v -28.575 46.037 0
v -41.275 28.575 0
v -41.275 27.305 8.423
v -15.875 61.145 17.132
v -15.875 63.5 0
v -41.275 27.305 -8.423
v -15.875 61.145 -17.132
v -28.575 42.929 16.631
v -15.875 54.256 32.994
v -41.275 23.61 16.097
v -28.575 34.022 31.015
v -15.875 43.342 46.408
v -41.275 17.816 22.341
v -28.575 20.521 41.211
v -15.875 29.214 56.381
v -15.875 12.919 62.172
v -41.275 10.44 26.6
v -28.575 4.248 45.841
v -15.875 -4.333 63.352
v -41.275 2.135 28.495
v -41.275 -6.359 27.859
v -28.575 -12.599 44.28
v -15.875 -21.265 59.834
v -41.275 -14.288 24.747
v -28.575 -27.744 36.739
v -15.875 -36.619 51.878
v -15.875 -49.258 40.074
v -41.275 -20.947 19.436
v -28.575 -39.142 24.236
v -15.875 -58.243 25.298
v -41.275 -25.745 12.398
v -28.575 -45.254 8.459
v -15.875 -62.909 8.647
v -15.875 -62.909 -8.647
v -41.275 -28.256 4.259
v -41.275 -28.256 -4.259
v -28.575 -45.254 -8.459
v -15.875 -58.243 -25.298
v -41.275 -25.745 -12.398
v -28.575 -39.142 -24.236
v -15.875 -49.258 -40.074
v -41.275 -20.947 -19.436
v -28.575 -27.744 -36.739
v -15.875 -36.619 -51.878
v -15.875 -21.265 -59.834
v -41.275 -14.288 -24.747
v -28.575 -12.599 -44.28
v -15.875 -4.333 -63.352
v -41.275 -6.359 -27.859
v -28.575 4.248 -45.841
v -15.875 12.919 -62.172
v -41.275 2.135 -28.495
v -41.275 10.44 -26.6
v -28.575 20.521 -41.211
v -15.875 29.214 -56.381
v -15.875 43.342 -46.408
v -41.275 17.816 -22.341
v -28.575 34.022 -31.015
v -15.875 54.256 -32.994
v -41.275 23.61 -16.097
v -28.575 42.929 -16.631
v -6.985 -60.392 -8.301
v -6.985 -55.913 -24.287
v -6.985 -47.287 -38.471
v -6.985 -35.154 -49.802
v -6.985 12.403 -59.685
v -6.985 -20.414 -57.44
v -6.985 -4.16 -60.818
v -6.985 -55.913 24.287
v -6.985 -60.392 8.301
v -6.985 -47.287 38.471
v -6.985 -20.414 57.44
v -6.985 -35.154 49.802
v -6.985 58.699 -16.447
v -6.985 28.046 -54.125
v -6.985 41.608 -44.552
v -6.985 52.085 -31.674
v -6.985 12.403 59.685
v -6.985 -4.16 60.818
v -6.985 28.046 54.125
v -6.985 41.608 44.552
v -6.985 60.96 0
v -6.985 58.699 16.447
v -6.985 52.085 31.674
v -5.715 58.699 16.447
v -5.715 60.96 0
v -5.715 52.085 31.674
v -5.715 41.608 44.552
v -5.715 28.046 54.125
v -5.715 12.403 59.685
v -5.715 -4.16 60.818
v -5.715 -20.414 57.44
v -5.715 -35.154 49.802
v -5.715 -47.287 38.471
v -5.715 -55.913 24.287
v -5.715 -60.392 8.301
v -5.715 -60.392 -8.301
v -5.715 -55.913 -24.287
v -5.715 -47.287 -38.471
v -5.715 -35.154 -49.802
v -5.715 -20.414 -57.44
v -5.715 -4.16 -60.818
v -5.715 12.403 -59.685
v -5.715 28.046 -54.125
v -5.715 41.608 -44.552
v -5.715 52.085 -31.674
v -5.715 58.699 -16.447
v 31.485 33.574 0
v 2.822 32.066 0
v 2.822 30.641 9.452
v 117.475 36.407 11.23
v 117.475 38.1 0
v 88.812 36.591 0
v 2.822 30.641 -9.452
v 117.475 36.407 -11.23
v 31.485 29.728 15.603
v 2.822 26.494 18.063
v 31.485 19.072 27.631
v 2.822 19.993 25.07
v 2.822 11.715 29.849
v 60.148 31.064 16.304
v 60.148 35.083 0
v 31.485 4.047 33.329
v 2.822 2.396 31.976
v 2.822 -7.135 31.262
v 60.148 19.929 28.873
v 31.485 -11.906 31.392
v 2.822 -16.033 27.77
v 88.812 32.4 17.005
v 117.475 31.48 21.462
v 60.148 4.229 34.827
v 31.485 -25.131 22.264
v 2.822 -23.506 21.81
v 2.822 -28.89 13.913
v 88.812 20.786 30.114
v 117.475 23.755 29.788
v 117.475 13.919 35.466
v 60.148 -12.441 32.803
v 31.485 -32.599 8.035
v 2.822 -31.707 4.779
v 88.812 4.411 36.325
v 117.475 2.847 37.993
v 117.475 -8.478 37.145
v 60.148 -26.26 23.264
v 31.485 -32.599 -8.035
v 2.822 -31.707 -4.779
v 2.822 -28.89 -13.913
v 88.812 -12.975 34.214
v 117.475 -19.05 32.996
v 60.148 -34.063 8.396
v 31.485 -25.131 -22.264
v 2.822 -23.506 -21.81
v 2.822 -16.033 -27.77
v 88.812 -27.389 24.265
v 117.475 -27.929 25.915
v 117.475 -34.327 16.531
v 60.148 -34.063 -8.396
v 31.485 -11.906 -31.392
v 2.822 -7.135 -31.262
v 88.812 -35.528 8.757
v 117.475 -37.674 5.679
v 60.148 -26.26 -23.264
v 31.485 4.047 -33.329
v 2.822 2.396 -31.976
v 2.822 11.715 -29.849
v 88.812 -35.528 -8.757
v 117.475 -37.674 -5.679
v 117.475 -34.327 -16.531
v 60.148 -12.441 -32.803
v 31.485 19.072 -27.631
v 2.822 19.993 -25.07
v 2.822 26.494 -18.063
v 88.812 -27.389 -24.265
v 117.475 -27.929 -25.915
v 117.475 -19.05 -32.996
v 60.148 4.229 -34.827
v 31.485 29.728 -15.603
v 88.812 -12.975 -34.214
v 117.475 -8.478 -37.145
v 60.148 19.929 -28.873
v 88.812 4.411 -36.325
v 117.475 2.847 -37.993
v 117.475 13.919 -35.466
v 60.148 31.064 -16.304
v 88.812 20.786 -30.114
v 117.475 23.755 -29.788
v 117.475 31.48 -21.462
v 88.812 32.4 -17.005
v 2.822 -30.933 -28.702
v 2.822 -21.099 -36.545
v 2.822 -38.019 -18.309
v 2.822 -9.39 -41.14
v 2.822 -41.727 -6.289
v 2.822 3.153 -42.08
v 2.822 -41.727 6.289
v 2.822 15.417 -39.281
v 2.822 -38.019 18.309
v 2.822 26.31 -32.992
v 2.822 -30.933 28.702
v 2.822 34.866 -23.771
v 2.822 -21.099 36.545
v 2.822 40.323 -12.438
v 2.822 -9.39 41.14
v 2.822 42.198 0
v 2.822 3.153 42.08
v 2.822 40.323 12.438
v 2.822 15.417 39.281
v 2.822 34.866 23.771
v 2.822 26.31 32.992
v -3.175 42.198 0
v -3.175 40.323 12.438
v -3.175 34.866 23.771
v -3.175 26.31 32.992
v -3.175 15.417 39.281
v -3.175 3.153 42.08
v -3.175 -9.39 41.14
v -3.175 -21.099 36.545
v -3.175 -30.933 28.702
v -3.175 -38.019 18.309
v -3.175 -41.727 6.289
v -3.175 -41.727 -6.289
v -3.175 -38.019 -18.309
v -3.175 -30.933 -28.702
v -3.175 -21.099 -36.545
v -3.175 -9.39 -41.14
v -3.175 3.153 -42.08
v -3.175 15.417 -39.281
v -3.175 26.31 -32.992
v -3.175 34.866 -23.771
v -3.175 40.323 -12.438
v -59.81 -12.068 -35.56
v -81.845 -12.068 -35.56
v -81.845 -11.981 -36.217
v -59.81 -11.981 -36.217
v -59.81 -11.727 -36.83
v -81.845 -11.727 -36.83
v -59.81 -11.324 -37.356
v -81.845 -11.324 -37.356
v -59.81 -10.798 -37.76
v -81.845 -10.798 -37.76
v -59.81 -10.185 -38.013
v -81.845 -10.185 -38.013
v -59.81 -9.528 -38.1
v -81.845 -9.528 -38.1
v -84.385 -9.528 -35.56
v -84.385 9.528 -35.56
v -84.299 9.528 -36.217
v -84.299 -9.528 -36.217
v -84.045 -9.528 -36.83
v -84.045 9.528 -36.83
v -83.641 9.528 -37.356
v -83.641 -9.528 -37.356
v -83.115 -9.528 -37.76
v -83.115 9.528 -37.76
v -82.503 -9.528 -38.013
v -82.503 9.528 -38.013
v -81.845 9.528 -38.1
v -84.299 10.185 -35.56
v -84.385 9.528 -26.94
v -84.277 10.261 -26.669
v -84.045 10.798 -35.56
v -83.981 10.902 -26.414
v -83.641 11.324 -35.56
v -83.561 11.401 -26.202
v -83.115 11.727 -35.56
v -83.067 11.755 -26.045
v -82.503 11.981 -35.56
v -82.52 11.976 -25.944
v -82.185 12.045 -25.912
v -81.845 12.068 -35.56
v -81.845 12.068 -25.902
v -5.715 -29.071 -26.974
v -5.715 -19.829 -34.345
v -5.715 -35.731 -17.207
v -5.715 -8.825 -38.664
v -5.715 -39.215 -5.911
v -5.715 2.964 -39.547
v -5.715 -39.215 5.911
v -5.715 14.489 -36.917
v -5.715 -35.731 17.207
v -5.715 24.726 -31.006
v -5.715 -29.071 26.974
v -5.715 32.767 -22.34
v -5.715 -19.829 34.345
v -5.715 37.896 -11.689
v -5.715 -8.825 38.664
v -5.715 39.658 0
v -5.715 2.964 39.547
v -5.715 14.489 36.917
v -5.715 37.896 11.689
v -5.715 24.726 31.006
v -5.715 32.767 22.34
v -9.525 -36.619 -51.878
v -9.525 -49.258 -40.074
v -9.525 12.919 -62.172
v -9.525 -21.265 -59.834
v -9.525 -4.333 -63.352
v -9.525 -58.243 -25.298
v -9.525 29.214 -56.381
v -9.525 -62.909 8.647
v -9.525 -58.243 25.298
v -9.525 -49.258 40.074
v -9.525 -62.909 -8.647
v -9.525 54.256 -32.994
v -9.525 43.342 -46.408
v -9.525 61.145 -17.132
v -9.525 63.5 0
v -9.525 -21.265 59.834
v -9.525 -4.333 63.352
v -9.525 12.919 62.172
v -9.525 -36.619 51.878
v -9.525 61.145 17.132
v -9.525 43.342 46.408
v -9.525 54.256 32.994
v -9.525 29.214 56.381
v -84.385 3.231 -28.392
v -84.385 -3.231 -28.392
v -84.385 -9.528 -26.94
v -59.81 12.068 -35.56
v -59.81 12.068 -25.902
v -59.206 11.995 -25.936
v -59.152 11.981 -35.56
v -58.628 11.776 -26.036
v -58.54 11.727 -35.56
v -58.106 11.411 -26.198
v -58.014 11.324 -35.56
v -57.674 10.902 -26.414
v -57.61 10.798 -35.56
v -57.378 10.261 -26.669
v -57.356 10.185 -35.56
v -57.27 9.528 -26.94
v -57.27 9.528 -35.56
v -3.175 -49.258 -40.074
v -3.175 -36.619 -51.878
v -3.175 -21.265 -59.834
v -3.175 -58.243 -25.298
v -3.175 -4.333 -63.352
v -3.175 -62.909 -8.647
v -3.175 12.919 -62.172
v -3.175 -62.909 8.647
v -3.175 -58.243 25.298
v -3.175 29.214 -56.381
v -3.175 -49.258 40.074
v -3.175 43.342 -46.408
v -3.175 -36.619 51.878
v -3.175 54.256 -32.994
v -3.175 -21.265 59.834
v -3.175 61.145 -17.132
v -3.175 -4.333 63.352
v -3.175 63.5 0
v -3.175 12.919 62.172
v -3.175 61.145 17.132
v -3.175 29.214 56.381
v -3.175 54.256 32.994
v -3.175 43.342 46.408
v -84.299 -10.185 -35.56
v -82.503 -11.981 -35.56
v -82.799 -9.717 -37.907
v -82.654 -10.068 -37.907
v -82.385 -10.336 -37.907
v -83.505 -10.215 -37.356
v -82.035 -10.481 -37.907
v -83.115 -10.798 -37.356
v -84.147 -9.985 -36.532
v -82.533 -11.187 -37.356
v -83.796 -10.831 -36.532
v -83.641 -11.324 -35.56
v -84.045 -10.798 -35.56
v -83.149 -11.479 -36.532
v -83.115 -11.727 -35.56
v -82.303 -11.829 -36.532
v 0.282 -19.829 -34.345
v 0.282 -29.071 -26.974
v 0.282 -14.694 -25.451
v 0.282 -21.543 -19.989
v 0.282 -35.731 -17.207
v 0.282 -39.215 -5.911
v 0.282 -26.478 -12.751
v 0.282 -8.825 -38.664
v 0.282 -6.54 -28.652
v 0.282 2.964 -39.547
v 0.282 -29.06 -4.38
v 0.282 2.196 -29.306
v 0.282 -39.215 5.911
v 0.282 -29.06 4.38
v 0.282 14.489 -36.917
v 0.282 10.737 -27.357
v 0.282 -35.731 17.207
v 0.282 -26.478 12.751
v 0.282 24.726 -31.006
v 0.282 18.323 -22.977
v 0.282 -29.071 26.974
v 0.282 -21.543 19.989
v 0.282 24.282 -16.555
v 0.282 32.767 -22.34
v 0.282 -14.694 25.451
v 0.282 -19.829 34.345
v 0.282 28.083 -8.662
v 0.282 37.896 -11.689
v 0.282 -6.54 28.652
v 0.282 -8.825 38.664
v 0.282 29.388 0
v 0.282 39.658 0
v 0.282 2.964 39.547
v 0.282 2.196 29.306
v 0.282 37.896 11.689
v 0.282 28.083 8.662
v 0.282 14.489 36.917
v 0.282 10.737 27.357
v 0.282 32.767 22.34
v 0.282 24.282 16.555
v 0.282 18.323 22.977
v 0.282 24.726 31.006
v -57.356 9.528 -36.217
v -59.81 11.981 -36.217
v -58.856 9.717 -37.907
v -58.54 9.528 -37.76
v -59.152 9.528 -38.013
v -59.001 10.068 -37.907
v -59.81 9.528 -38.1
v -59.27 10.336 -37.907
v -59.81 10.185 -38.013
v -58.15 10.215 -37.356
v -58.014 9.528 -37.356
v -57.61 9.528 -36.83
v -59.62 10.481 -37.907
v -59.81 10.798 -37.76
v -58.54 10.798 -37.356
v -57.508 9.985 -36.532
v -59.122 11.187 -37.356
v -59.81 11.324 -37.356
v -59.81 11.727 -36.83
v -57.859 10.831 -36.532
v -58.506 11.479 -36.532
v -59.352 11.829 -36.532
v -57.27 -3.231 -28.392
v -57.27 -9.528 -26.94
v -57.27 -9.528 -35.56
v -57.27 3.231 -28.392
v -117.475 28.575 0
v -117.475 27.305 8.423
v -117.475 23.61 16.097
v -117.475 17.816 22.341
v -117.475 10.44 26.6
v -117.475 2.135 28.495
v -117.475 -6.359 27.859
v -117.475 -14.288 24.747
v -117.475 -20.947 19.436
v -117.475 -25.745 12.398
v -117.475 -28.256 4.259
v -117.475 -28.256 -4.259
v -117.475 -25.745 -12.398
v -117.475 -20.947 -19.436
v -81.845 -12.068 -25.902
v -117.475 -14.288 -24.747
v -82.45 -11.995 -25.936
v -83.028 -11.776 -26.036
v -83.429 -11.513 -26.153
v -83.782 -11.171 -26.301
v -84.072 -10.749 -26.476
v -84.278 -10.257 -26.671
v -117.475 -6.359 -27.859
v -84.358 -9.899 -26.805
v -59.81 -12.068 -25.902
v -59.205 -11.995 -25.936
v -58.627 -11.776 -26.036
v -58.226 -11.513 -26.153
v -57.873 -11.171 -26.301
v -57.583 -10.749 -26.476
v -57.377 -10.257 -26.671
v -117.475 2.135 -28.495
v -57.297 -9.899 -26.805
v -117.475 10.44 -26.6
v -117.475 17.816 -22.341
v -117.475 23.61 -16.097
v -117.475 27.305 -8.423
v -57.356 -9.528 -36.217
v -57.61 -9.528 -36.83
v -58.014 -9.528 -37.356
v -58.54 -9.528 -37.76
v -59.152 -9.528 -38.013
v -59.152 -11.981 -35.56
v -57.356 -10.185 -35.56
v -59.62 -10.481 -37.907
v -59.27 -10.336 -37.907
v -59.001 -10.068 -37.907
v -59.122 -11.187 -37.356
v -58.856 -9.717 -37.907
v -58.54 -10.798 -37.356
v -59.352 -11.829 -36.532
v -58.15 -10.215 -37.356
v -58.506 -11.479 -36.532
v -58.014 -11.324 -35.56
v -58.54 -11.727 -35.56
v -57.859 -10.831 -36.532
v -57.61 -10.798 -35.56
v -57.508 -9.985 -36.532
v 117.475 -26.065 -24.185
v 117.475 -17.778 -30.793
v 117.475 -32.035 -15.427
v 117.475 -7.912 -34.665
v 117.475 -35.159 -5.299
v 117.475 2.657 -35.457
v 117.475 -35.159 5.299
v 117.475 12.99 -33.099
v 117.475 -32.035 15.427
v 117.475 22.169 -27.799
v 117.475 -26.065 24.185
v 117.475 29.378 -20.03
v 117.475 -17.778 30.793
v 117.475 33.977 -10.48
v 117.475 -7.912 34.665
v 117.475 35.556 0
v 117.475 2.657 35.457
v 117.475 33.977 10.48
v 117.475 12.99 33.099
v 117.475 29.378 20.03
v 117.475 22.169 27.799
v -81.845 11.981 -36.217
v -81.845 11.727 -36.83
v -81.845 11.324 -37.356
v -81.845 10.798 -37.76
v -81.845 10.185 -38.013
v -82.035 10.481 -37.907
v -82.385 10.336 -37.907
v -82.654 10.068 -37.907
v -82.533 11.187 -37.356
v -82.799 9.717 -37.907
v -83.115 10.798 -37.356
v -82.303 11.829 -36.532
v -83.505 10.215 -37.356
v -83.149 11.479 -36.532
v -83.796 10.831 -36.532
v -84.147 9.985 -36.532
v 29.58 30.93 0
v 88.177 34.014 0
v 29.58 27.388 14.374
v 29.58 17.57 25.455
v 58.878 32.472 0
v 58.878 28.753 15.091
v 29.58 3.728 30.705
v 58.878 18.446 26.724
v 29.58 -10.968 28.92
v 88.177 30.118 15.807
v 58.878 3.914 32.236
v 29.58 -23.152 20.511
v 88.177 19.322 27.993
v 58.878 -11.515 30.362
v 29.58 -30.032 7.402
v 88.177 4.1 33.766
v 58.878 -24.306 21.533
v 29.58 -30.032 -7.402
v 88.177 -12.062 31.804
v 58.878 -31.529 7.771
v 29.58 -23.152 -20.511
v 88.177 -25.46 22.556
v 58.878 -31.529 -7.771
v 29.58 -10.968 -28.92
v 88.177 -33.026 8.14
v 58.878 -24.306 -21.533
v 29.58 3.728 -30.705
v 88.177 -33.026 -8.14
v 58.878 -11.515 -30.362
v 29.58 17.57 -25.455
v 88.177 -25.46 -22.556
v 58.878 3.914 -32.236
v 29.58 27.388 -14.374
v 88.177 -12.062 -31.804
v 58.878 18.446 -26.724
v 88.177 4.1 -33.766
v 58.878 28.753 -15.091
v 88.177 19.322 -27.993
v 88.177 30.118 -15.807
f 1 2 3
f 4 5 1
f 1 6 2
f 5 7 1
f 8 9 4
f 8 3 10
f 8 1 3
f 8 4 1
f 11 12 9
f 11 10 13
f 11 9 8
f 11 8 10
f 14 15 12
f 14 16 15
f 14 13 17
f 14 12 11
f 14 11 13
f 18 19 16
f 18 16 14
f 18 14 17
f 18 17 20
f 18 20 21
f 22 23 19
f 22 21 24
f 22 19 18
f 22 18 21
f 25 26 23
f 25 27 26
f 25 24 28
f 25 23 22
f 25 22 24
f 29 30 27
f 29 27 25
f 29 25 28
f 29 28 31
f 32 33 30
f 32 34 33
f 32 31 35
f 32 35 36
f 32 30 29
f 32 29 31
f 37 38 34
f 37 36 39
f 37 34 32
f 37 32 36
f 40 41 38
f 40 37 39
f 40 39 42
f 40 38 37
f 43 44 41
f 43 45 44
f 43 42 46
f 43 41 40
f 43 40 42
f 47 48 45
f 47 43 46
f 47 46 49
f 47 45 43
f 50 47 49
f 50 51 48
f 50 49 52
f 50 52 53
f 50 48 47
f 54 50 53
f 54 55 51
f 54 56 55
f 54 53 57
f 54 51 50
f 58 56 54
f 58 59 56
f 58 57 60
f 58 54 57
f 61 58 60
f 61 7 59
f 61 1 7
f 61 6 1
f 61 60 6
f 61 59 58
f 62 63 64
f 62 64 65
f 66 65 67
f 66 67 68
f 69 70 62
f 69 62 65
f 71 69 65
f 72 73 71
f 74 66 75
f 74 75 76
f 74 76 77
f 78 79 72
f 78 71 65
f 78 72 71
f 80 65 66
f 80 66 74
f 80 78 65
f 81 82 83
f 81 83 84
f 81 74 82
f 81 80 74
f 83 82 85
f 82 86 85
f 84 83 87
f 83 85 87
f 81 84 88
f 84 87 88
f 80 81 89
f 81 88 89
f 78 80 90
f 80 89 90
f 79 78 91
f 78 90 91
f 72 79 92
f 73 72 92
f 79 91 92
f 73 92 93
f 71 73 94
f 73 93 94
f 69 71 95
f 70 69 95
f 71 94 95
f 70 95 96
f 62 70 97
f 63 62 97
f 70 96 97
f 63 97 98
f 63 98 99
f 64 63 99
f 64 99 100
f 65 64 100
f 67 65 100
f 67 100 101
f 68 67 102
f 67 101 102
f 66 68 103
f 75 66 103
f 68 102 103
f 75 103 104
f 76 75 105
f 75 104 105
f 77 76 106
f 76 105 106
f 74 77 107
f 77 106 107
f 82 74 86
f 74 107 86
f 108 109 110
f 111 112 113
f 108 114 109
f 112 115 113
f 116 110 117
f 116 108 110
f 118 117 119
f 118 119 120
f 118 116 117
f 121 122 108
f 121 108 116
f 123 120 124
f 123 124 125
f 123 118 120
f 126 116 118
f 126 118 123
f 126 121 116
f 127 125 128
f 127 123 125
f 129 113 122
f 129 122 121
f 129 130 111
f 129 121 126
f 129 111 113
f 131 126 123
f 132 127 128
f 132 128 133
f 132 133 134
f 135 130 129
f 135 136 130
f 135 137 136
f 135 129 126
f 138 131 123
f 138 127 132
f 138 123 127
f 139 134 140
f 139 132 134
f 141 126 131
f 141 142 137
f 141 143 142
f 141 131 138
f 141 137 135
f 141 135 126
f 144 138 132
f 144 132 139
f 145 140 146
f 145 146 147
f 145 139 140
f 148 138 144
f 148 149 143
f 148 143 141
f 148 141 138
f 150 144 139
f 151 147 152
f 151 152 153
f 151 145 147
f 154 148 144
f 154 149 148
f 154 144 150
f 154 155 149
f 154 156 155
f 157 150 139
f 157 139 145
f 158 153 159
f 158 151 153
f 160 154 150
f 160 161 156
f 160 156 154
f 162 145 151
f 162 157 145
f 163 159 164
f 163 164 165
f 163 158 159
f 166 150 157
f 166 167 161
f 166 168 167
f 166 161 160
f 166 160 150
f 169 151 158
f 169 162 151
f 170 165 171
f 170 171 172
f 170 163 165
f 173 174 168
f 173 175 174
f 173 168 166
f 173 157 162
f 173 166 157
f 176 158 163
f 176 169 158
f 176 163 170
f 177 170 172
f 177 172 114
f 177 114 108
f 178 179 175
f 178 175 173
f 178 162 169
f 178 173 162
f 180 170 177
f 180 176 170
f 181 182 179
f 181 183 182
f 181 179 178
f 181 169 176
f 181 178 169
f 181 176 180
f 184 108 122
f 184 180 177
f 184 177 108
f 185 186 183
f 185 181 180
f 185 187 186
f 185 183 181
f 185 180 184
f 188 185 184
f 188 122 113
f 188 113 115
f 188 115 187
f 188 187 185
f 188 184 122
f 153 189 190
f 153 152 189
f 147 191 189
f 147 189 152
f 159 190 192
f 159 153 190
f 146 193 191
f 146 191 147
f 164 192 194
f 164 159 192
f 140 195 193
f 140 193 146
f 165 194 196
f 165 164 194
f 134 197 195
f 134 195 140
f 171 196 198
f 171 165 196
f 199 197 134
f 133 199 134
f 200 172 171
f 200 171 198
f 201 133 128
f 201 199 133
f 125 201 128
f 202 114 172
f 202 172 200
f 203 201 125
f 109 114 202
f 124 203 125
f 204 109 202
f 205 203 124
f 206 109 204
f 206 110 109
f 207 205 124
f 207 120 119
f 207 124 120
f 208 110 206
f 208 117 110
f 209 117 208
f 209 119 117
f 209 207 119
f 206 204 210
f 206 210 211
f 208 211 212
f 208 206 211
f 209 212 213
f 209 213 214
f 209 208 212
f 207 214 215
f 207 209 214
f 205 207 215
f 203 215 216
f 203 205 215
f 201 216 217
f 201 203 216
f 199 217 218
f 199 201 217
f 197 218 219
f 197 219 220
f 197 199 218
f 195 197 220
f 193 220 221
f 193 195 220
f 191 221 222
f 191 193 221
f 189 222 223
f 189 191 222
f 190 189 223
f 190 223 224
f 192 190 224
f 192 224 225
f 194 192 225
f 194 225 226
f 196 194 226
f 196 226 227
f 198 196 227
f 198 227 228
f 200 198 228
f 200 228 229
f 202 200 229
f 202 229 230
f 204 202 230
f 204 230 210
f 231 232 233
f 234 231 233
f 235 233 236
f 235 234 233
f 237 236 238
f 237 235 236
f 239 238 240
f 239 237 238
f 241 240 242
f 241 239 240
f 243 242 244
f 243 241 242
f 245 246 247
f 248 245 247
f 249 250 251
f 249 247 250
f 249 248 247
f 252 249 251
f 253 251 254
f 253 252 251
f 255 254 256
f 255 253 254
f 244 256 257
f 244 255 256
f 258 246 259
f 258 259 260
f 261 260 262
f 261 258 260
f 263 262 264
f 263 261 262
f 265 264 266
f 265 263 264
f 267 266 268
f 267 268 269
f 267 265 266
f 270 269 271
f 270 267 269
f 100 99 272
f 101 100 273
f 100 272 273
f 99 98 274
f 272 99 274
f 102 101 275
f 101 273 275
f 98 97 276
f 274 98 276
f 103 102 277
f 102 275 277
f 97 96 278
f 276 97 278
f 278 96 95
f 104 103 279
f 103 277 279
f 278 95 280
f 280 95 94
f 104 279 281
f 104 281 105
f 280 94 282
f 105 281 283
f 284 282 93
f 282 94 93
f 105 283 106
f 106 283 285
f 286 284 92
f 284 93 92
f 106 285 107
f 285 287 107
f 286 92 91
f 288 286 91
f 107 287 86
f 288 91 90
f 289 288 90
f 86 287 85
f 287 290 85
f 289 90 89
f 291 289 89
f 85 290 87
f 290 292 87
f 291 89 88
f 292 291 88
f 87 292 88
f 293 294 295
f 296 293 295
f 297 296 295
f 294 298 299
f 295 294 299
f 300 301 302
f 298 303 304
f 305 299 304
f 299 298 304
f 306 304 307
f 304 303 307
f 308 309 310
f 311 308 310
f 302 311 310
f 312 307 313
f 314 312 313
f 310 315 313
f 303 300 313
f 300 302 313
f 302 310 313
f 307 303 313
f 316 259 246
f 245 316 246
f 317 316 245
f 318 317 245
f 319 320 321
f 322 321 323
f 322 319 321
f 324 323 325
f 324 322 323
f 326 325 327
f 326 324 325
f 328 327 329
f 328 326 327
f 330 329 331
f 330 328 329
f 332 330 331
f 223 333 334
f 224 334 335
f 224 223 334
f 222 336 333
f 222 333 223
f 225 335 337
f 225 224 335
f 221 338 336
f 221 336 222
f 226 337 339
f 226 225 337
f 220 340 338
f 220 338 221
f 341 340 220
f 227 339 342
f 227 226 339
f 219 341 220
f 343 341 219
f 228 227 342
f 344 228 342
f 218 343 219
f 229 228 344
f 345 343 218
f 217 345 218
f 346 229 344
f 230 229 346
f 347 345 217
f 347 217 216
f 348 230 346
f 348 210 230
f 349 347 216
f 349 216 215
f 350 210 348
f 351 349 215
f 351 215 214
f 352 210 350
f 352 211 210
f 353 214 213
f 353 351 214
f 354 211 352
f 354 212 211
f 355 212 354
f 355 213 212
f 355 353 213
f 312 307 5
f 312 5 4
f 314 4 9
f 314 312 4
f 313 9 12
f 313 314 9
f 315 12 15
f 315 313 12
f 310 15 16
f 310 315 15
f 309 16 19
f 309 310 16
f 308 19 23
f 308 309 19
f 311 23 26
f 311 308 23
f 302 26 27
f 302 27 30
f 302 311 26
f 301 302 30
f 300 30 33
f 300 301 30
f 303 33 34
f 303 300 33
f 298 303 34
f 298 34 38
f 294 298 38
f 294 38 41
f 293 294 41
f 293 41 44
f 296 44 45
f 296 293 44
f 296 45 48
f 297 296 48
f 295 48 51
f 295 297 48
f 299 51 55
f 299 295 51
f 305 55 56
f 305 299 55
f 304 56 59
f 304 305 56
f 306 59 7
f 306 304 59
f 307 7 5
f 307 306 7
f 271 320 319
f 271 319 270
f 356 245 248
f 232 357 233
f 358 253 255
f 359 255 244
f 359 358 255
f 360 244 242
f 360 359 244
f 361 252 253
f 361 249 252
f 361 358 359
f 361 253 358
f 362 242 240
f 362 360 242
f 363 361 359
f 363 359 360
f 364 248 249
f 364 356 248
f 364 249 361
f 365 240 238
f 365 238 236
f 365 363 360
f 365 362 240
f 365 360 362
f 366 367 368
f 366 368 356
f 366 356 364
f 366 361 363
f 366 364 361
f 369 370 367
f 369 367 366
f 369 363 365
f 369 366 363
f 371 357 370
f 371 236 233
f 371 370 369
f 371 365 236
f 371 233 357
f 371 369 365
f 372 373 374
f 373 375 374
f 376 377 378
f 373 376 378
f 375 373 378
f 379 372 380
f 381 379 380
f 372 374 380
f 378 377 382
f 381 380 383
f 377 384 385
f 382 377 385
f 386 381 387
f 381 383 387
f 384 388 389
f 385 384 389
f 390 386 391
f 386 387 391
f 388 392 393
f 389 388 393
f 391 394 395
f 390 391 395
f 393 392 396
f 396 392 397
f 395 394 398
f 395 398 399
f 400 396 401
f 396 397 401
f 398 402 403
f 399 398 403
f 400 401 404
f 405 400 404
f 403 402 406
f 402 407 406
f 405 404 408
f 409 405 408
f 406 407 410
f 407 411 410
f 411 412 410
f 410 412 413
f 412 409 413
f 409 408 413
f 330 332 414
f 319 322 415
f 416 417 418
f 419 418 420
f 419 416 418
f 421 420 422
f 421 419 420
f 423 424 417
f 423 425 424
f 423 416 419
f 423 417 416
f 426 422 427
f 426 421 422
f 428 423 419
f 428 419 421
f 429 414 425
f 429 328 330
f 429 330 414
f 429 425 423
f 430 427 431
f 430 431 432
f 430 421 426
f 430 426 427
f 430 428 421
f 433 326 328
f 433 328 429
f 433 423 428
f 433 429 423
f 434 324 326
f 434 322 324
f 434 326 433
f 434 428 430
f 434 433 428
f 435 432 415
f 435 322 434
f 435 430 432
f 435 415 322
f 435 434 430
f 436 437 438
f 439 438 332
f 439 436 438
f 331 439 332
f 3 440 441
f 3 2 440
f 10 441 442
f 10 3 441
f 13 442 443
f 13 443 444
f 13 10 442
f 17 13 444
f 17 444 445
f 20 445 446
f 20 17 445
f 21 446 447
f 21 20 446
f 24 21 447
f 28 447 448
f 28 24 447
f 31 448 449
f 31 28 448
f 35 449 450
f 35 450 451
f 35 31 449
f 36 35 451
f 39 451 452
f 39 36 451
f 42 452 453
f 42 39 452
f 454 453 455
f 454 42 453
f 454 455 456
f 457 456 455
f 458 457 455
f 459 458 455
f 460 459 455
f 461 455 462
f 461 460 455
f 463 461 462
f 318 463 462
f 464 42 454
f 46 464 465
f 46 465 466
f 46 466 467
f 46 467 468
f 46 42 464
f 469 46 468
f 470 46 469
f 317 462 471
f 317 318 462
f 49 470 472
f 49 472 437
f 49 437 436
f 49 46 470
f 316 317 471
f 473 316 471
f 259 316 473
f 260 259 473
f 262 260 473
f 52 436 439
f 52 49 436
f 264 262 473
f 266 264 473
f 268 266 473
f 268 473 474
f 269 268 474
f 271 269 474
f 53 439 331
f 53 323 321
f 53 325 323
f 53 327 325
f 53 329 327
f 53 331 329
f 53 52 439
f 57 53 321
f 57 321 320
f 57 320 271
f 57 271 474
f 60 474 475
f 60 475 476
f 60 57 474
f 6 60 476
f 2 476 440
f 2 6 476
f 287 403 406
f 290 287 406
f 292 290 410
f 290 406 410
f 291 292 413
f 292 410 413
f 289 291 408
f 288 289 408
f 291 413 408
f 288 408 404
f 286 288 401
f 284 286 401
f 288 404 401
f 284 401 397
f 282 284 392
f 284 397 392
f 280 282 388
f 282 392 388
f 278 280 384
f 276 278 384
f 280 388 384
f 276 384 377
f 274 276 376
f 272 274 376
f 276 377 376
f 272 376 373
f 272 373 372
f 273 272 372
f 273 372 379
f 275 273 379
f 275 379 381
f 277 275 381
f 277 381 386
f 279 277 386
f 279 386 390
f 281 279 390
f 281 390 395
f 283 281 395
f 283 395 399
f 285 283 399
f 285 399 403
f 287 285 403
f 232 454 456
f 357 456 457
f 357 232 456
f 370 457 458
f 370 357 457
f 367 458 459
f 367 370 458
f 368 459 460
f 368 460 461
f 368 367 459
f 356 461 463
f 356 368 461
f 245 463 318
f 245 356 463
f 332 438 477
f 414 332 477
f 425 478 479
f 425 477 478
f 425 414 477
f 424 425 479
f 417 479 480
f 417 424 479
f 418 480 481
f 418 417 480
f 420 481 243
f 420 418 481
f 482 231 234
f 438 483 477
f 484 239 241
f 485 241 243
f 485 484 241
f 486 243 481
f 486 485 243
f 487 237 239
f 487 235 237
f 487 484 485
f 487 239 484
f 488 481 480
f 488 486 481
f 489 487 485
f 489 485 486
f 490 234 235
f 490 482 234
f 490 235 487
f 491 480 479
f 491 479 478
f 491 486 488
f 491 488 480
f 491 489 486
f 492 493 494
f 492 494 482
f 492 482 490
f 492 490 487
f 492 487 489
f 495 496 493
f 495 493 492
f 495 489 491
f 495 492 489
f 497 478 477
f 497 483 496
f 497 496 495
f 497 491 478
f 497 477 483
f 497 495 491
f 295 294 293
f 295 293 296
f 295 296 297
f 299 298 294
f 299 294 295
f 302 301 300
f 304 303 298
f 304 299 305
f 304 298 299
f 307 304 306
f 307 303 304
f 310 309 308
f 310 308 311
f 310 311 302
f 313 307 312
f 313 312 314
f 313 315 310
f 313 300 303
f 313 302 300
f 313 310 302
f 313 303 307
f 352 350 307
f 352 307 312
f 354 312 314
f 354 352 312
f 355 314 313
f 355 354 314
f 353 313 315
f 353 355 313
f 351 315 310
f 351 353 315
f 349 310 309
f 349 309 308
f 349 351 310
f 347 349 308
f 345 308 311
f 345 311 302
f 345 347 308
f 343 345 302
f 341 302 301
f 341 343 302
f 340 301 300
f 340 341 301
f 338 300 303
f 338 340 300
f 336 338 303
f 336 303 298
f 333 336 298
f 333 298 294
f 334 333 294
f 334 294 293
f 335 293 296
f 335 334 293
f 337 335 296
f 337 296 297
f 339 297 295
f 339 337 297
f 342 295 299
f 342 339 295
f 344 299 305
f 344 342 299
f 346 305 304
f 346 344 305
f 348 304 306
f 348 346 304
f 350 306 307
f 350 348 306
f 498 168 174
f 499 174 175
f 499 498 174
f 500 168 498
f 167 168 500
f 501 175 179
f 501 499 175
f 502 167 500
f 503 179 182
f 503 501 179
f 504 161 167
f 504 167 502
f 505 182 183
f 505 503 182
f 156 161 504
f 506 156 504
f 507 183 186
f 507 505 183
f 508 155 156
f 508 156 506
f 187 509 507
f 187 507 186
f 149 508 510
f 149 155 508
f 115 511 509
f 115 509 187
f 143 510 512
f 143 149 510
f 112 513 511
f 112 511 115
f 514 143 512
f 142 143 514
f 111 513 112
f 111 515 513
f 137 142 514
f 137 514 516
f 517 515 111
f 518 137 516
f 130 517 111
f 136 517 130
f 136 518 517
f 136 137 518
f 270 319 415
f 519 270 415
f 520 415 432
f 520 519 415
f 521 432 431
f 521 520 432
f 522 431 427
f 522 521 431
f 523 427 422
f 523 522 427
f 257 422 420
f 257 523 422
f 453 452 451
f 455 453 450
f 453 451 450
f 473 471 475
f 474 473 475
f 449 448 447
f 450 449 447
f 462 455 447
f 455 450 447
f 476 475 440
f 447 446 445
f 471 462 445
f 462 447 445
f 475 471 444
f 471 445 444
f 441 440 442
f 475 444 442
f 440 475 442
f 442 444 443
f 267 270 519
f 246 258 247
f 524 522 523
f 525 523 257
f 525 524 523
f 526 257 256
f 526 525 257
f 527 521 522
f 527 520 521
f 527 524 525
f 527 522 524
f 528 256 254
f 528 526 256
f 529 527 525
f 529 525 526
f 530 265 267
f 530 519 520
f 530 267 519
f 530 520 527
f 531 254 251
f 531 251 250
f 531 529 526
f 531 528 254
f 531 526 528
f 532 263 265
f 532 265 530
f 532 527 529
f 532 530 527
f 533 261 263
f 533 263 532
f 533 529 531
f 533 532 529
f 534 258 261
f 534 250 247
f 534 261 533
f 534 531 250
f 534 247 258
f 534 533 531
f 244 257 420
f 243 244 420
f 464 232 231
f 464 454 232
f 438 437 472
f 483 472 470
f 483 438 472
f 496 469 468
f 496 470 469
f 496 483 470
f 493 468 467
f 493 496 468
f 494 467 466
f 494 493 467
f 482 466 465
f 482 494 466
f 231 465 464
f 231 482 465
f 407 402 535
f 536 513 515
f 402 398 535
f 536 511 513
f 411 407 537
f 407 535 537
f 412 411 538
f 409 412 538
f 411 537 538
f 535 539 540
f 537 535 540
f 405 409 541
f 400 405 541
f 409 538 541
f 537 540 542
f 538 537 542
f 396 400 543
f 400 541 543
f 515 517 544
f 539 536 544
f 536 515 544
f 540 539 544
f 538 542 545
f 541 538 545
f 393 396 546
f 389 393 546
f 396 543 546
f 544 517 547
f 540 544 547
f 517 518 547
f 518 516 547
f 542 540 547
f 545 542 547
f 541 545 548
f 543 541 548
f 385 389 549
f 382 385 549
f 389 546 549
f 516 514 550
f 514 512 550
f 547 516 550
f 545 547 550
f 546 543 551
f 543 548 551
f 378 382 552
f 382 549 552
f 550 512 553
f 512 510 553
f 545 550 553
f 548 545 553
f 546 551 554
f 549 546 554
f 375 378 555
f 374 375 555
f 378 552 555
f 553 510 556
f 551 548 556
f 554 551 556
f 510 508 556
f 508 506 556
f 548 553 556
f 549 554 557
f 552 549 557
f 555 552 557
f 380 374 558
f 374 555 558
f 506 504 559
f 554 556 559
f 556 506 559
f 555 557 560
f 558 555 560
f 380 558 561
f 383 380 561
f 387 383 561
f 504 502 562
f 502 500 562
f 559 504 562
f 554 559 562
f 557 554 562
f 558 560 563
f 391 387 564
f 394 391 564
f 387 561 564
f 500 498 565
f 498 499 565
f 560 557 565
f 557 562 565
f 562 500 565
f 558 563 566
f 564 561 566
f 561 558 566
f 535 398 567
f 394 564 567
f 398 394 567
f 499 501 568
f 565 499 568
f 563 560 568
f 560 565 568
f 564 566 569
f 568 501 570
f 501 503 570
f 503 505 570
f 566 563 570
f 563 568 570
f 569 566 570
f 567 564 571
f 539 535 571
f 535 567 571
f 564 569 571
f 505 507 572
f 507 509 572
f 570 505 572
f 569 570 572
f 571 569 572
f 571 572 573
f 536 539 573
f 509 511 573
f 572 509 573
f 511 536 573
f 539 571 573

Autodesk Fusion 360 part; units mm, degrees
sketch "Sketch1" plane through (0, 0, 0) normal (0, 0, 1) x (1, 0, 0)
  line L0 (-117.475, 0) -> (-117.475, 28.575)
  line L1 (-117.475, 28.575) -> (-41.275, 28.575)
  line L2 (-41.275, 28.575) -> (-15.875, 63.5)
  line L3 (-15.875, 63.5) -> (-3.175, 63.5)
  line L4 (-3.175, 63.5) -> (-3.175, 31.75)
  line L5 (-3.175, 31.75) -> (117.475, 38.1)
  line L6 (117.475, 38.1) -> (117.475, 0)
  line L7 (-117.475, 0) -> (117.475, 0)
  line L8 (-9.525, 63.5) -> (-9.525, 0)
  line L9 (-3.175, 42.198) -> (2.8215, 42.198)
  line L10 (2.8215, 42.198) -> (2.8215, 30.3668)
  line L11 (2.8215, 30.3668) -> (-3.175, 30.3668)
  line L12 (-3.175, 30.3668) -> (-3.175, 42.198)
  dimension "d1" = 28.575
  dimension "d2" = 76.2
  dimension "d3" = 25.4
  dimension "d4" = 12.7
  dimension "d5" = 63.5
  dimension "d6" = 38.1
  dimension "d7" = 120.65
  dimension "d8" = 31.75
revolve "Revolve1" add sketch "Sketch1" angle 360 about axis through (-117.475, 0, 0) along (1, 0, 0) contours L3 L4 L5 L6 L7 L8 L10 L11 L12 | L5 L10 L11 L12 | L4 L5 L9 L10 L12 makes body 1
revolve "Revolve2" add sketch "Sketch1" angle 360 about axis through (-117.475, 0, 0) along (1, 0, 0) separate body contours L0 L1 L2 L3 L7 L8 makes body 2
sketch "Sketch2" plane through (0, 0, 0) normal (0, 0, 1) x (1, 0, 0)
  line L0 (-57.2697, 12.0676) -> (-84.3853, 12.0676)
  line L1 (-84.3853, 12.0676) -> (-84.3853, -12.0676)
  line L2 (-84.3853, -12.0676) -> (-57.2697, -12.0676)
  line L3 (-57.2697, -12.0676) -> (-57.2697, 12.0676)
  line L4 (-57.2697, 12.0676) -> (-84.3853, -12.0676) construction
  line L5 (-84.3853, 12.0676) -> (-57.2697, -12.0676) construction
  point P0 (-70.8275, 0)
extrude "Extrude1" add sketch "Sketch2" against normal blind 38.1 bodies 2
shell "Shell1" thickness 2.54 removed faces 1 at (117.475, 4.6398, -0.8014) on bodies 1
fillet "Fillet1" radius 2.54 4 edges at (-84.3853, 12.0676, -32.0009) (-84.3853, -12.0676, -32.0009) (-57.2697, 12.0676, -32.0009) (-57.2697, -12.0676, -32.0009) 1 faces at (-66.3083, -4.0225, -38.1) on bodies 2
equation "d1 = ( 2.25 / 2 ) * 1 in"
equation "d8 = ( 2.5 / 2 ) * 1 in"
